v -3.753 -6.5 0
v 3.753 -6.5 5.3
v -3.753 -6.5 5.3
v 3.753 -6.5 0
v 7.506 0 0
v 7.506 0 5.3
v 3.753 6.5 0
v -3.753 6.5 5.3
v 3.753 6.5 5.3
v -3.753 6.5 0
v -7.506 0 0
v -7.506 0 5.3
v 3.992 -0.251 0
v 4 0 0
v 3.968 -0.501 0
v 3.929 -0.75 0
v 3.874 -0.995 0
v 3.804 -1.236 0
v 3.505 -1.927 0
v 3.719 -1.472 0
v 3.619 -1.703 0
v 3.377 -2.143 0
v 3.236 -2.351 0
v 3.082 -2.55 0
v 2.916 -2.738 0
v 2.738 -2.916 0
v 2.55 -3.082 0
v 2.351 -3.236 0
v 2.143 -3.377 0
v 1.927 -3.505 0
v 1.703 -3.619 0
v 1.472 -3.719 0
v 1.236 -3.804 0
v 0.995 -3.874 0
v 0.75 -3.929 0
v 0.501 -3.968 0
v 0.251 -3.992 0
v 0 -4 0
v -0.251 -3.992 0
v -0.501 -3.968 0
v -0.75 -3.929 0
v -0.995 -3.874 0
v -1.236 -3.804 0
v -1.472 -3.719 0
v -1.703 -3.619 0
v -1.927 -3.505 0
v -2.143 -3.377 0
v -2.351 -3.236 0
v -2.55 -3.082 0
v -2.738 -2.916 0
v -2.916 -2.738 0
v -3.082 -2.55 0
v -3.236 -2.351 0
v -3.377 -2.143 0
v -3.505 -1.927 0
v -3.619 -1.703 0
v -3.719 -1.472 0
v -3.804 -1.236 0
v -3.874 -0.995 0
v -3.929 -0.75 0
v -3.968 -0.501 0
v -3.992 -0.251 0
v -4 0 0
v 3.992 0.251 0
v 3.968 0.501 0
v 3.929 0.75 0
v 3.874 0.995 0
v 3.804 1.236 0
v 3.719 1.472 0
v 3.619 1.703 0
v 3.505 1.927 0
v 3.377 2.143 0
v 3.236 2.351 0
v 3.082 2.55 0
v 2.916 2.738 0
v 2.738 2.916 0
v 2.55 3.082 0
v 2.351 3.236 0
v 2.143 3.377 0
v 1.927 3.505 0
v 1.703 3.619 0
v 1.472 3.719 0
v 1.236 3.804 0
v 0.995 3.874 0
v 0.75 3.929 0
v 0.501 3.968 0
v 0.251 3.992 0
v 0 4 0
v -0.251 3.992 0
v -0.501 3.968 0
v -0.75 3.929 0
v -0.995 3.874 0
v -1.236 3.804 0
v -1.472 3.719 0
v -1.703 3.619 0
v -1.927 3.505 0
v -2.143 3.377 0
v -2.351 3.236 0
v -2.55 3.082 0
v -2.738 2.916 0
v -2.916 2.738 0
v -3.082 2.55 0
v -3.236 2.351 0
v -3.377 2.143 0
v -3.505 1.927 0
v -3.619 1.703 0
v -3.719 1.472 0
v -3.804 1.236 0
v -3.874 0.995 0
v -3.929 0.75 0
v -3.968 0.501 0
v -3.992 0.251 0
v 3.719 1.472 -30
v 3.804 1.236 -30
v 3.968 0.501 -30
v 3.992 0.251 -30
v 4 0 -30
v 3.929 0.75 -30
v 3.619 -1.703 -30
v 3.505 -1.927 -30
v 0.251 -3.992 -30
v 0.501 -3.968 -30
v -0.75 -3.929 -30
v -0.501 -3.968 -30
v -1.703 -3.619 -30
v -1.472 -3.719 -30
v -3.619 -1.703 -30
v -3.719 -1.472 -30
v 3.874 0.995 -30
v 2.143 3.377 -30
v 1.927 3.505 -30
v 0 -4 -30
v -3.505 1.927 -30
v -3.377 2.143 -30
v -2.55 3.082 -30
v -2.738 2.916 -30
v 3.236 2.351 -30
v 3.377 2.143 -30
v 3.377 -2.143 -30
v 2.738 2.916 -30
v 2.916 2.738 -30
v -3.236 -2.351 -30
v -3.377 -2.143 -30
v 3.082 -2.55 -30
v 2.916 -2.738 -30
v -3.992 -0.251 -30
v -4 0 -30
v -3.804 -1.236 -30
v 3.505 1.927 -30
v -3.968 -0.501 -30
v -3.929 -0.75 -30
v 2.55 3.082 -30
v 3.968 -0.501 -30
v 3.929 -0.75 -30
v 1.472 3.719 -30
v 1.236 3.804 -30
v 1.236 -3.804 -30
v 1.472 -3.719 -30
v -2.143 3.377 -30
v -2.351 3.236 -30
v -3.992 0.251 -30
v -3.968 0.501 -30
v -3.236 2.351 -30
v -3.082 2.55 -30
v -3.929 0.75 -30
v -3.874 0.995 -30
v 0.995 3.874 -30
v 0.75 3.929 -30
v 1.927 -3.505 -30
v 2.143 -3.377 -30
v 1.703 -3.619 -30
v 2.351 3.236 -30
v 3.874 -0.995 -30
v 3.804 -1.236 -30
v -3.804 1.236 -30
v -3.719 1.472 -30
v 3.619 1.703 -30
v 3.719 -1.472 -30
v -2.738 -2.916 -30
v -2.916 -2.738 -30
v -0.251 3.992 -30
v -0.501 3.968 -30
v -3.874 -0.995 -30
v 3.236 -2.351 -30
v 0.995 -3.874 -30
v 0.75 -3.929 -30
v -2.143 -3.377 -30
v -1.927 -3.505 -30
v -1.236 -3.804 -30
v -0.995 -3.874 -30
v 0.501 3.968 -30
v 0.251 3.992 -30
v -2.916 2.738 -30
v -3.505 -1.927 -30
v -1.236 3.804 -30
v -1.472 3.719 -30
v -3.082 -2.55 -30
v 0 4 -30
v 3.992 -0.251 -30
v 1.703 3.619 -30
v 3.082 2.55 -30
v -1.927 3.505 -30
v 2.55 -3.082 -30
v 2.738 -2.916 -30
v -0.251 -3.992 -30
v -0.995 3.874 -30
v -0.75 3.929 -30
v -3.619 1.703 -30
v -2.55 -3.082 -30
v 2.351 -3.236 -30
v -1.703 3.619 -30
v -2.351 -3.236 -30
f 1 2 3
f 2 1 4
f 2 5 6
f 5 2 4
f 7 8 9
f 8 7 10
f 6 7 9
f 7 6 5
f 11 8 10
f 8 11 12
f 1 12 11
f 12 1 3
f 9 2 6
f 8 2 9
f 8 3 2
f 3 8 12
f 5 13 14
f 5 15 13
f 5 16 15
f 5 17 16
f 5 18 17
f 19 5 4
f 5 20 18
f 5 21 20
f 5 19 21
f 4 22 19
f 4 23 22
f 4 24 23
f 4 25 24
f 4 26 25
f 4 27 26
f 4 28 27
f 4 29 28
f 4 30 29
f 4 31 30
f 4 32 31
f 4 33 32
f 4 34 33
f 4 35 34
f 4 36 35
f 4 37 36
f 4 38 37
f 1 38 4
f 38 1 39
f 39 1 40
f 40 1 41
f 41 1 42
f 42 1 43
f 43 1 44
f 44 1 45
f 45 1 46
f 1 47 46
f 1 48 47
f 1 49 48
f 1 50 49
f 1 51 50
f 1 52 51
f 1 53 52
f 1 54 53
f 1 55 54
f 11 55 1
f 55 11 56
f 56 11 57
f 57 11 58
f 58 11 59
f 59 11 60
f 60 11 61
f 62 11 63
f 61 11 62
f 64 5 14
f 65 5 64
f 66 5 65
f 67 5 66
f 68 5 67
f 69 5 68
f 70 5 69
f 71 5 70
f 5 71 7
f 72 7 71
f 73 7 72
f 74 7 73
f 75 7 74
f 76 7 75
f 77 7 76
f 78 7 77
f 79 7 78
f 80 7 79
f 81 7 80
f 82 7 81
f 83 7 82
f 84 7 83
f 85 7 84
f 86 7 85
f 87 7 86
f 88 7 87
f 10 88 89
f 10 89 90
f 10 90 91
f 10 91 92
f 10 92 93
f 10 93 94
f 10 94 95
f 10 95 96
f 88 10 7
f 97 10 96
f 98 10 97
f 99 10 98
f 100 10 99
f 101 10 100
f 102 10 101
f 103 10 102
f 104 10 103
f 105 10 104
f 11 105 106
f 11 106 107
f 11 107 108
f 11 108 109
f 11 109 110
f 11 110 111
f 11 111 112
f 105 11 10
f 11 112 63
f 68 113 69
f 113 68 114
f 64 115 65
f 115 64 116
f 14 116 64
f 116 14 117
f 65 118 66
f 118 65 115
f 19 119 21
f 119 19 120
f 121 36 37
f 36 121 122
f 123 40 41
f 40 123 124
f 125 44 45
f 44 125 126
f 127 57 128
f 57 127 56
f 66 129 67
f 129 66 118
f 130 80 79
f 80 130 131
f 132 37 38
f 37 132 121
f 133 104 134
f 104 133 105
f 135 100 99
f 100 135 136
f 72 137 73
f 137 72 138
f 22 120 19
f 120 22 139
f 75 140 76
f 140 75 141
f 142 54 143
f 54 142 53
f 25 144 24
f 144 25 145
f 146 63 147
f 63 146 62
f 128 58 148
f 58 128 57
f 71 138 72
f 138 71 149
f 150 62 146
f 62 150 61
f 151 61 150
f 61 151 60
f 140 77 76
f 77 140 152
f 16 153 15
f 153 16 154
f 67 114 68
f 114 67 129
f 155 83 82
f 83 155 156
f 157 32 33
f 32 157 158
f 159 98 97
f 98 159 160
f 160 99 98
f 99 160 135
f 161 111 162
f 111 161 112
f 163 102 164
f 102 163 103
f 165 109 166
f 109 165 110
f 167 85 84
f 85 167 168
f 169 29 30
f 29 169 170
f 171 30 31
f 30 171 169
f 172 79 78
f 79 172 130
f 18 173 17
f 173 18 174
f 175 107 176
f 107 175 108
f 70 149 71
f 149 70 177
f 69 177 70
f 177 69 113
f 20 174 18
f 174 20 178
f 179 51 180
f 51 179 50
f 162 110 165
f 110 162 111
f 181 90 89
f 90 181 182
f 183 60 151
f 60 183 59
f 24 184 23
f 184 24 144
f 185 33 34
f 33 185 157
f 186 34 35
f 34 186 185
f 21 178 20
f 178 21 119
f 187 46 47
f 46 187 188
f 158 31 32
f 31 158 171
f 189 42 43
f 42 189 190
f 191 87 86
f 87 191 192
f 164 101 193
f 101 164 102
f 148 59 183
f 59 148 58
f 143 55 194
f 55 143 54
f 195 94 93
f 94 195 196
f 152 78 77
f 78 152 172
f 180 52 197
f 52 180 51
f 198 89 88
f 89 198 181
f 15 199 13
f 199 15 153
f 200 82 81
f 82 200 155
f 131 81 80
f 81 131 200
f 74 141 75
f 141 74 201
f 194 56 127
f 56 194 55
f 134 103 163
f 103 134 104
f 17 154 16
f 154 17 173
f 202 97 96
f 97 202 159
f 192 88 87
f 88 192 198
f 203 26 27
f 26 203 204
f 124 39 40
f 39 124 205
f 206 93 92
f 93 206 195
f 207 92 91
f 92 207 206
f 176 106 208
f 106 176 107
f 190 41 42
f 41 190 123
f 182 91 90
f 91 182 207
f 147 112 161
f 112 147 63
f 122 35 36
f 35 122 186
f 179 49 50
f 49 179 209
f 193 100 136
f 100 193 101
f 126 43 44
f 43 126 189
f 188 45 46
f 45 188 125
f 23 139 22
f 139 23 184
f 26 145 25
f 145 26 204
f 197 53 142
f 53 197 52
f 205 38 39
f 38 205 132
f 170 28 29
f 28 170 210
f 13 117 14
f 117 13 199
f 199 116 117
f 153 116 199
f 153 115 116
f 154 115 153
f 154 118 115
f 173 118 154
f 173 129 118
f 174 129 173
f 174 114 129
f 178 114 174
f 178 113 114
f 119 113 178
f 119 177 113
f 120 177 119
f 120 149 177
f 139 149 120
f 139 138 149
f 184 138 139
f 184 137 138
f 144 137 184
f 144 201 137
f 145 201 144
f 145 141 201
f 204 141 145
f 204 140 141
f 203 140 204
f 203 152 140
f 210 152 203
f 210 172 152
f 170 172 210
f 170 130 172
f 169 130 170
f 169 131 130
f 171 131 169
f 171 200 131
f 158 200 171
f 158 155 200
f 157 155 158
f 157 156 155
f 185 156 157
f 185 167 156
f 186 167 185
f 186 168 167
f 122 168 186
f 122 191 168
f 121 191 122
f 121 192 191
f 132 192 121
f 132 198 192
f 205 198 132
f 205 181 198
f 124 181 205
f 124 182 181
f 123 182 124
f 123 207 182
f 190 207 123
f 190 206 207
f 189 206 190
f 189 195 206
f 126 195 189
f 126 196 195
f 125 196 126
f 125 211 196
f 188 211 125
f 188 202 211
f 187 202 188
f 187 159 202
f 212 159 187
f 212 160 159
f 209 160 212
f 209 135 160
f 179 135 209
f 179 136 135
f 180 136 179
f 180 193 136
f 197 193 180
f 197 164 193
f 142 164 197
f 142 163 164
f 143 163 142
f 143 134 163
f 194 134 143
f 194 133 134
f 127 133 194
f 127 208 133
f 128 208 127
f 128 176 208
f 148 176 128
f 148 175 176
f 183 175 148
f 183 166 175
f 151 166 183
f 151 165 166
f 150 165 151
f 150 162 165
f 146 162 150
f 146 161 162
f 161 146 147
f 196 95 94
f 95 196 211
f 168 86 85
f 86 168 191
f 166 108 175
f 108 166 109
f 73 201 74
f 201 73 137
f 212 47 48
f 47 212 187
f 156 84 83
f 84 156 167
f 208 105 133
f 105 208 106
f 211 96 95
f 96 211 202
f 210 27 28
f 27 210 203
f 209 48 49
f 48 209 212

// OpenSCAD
// M8 Hex Bolt (simplified, no threads)
// Head: hex prism, across-flats = 13mm, height = 5.3mm
// Shank: cylinder, diameter = 8mm, length = 30mm
// Head bottom at z=0, shank extends to z<0

$fn = 100;

across_flats = 13;
head_height = 5.3;
shank_diameter = 8;
shank_length = 30;

// across-flats to circumscribed circle radius for hexagon
// width across flats = sqrt(3) * r  =>  r = af / sqrt(3)
hex_radius = across_flats / sqrt(3);

// Head: hexagonal prism above z=0
cylinder(h = head_height, r = hex_radius, $fn = 6);

// Shank: cylinder below z=0
translate([0, 0, -shank_length])
    cylinder(h = shank_length, d = shank_diameter);
